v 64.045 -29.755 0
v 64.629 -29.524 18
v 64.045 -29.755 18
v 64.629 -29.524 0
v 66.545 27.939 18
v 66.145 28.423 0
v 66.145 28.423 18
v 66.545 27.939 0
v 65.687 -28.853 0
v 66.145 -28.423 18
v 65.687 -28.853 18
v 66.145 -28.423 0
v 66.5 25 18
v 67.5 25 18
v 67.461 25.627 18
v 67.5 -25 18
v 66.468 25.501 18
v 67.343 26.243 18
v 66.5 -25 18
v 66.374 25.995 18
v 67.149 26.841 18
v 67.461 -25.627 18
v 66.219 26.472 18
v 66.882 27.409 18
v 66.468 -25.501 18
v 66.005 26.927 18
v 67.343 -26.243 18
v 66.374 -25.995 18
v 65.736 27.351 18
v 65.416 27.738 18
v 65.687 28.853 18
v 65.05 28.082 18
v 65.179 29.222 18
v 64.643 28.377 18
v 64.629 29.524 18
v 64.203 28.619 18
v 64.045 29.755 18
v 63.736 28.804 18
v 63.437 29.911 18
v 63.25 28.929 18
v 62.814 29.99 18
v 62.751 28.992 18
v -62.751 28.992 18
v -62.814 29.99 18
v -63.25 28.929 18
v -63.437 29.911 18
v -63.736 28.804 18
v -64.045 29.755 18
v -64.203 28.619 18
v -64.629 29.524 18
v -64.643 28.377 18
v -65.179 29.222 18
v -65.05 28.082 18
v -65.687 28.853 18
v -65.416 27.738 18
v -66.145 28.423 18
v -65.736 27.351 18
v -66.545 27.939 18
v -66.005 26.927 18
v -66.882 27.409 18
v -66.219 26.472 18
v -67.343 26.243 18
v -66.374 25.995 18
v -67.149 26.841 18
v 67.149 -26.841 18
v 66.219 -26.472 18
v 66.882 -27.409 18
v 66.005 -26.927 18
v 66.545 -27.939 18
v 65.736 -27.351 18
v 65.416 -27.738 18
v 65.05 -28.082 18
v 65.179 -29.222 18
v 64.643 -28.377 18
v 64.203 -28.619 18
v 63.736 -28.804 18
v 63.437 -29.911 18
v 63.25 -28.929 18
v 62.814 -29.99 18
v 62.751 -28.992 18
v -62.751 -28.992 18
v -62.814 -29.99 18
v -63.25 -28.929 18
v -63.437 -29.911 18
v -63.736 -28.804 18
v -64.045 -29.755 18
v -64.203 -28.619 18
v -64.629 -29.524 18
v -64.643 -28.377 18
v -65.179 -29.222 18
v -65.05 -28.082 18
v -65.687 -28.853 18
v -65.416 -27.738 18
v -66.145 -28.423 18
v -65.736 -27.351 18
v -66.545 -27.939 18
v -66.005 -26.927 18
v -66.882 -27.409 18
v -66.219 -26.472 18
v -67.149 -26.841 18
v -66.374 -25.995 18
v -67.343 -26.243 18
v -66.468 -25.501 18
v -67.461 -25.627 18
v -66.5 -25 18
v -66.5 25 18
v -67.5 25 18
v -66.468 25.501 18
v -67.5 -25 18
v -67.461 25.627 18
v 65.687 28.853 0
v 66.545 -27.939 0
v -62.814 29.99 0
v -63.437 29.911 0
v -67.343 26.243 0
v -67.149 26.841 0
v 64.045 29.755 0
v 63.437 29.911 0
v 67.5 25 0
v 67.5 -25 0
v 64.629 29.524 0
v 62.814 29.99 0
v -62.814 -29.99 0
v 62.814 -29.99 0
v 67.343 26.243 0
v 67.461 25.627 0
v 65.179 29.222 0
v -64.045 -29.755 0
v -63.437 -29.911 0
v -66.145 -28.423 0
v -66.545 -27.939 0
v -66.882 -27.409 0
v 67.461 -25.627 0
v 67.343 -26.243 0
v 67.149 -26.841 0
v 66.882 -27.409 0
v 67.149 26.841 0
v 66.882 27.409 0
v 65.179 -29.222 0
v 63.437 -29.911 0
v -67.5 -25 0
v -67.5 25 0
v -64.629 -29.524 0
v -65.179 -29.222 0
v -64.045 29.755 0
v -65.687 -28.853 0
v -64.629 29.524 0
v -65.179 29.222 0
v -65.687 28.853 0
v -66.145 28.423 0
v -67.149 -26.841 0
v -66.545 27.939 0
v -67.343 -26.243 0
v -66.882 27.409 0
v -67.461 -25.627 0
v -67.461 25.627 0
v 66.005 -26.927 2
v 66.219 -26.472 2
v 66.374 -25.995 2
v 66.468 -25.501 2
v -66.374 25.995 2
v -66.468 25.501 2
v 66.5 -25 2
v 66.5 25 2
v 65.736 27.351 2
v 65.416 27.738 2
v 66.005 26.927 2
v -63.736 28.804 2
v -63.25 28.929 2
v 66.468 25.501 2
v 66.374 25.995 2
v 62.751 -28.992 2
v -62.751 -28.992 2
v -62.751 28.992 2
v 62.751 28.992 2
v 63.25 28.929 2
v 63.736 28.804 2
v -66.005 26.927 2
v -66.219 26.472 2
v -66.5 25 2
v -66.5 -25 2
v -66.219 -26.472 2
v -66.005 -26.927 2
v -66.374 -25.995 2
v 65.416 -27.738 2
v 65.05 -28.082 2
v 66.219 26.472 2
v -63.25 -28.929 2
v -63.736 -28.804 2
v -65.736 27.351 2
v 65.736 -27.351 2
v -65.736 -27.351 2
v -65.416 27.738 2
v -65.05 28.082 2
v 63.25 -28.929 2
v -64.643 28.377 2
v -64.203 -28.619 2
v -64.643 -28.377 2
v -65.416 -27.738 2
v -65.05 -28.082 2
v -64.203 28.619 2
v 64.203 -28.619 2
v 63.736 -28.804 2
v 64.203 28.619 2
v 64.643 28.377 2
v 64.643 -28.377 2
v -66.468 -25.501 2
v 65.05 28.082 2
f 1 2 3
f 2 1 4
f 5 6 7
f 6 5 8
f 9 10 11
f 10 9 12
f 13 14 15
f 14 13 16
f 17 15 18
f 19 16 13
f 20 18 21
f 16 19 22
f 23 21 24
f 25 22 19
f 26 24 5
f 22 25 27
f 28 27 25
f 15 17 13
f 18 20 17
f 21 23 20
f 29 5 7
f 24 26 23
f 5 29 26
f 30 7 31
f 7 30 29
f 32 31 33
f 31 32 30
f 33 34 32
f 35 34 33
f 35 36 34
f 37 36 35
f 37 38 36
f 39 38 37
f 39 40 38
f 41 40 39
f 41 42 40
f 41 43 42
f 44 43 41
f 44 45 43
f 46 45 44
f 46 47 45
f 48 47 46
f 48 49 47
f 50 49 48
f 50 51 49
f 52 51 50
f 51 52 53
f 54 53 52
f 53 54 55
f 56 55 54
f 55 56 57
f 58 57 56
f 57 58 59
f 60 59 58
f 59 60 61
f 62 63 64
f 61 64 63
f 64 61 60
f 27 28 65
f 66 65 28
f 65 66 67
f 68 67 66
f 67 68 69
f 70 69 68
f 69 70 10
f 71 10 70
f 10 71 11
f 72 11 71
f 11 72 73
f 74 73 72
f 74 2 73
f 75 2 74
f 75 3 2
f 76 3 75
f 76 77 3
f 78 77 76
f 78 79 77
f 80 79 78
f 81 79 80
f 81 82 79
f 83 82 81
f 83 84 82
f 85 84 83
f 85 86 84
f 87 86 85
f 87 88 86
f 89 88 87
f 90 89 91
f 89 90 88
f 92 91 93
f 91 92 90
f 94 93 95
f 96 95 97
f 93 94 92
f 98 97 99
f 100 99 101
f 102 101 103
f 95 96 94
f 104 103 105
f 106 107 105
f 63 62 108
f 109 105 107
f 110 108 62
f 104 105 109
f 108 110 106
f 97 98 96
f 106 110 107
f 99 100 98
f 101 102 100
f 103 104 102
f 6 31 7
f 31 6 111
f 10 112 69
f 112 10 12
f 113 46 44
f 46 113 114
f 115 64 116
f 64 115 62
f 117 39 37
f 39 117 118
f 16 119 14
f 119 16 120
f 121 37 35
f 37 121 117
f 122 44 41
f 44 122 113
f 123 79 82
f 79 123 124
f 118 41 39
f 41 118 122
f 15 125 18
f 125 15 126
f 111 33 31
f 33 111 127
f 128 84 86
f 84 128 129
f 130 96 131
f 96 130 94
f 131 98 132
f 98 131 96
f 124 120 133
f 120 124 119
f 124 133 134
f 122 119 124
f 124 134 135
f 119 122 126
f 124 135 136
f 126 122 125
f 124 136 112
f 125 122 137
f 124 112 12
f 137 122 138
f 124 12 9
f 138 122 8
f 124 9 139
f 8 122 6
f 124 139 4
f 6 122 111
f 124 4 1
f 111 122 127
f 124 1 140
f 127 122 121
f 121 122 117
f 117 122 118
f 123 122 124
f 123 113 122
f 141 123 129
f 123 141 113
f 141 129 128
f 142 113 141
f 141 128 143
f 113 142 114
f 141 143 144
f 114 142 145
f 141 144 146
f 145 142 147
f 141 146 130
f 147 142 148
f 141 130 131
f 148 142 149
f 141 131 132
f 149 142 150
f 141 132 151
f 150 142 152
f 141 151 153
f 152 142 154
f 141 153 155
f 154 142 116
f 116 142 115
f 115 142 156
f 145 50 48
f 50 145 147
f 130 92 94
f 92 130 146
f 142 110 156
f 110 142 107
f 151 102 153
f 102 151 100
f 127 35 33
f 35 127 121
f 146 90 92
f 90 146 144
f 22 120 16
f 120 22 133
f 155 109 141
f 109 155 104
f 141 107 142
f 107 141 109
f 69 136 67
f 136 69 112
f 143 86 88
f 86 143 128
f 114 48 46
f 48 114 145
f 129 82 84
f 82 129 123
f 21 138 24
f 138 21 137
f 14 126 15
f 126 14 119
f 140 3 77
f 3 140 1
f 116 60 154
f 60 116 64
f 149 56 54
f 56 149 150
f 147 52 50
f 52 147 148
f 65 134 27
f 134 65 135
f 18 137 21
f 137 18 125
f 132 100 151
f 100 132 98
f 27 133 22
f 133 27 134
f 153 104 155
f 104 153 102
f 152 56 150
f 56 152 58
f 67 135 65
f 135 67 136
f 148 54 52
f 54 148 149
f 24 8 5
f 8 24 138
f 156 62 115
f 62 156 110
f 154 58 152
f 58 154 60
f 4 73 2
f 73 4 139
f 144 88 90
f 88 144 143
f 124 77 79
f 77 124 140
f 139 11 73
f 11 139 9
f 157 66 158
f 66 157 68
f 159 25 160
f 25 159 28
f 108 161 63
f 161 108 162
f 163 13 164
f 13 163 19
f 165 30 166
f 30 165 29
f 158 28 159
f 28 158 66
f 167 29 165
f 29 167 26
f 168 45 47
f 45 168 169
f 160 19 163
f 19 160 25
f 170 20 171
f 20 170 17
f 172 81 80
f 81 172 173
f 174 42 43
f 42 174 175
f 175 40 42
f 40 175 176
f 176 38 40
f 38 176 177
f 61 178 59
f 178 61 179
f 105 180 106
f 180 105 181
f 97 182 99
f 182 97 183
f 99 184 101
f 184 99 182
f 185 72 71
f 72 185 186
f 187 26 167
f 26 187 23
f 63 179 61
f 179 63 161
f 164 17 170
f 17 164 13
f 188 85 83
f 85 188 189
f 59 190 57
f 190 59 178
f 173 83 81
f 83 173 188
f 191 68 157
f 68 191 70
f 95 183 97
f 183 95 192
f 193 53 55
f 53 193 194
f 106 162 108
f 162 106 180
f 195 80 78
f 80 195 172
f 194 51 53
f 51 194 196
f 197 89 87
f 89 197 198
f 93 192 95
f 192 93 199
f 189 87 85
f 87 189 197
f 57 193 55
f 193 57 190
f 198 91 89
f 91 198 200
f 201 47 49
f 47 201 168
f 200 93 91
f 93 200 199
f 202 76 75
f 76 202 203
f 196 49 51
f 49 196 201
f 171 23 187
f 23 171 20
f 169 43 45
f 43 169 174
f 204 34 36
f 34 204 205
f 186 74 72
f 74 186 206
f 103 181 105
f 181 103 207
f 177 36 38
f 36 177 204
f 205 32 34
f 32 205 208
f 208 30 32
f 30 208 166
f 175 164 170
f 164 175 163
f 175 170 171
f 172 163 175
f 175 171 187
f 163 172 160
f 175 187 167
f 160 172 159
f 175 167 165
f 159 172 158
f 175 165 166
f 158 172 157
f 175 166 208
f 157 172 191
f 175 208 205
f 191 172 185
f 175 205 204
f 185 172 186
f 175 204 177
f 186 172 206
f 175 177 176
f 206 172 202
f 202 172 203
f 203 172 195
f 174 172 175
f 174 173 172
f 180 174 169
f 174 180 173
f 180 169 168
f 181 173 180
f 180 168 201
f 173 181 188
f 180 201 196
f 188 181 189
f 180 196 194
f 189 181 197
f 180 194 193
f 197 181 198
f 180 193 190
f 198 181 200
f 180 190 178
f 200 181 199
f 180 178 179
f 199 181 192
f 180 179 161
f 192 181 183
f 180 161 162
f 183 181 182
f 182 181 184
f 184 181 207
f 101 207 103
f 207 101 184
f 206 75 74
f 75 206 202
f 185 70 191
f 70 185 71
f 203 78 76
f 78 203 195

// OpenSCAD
$fn = 50;


difference() {
	union() {
		hull() {
			translate(v = [-62.5000000000, 25.0000000000, 0]) {
				cylinder(h = 18, r = 5);
			}
			translate(v = [62.5000000000, 25.0000000000, 0]) {
				cylinder(h = 18, r = 5);
			}
			translate(v = [-62.5000000000, -25.0000000000, 0]) {
				cylinder(h = 18, r = 5);
			}
			translate(v = [62.5000000000, -25.0000000000, 0]) {
				cylinder(h = 18, r = 5);
			}
		}
	}
	union() {
		translate(v = [0, 0, 2]) {
			hull() {
				translate(v = [-62.5000000000, 25.0000000000, 0]) {
					cylinder(h = 16, r = 4);
				}
				translate(v = [62.5000000000, 25.0000000000, 0]) {
					cylinder(h = 16, r = 4);
				}
				translate(v = [-62.5000000000, -25.0000000000, 0]) {
					cylinder(h = 16, r = 4);
				}
				translate(v = [62.5000000000, -25.0000000000, 0]) {
					cylinder(h = 16, r = 4);
				}
			}
		}
	}
}
